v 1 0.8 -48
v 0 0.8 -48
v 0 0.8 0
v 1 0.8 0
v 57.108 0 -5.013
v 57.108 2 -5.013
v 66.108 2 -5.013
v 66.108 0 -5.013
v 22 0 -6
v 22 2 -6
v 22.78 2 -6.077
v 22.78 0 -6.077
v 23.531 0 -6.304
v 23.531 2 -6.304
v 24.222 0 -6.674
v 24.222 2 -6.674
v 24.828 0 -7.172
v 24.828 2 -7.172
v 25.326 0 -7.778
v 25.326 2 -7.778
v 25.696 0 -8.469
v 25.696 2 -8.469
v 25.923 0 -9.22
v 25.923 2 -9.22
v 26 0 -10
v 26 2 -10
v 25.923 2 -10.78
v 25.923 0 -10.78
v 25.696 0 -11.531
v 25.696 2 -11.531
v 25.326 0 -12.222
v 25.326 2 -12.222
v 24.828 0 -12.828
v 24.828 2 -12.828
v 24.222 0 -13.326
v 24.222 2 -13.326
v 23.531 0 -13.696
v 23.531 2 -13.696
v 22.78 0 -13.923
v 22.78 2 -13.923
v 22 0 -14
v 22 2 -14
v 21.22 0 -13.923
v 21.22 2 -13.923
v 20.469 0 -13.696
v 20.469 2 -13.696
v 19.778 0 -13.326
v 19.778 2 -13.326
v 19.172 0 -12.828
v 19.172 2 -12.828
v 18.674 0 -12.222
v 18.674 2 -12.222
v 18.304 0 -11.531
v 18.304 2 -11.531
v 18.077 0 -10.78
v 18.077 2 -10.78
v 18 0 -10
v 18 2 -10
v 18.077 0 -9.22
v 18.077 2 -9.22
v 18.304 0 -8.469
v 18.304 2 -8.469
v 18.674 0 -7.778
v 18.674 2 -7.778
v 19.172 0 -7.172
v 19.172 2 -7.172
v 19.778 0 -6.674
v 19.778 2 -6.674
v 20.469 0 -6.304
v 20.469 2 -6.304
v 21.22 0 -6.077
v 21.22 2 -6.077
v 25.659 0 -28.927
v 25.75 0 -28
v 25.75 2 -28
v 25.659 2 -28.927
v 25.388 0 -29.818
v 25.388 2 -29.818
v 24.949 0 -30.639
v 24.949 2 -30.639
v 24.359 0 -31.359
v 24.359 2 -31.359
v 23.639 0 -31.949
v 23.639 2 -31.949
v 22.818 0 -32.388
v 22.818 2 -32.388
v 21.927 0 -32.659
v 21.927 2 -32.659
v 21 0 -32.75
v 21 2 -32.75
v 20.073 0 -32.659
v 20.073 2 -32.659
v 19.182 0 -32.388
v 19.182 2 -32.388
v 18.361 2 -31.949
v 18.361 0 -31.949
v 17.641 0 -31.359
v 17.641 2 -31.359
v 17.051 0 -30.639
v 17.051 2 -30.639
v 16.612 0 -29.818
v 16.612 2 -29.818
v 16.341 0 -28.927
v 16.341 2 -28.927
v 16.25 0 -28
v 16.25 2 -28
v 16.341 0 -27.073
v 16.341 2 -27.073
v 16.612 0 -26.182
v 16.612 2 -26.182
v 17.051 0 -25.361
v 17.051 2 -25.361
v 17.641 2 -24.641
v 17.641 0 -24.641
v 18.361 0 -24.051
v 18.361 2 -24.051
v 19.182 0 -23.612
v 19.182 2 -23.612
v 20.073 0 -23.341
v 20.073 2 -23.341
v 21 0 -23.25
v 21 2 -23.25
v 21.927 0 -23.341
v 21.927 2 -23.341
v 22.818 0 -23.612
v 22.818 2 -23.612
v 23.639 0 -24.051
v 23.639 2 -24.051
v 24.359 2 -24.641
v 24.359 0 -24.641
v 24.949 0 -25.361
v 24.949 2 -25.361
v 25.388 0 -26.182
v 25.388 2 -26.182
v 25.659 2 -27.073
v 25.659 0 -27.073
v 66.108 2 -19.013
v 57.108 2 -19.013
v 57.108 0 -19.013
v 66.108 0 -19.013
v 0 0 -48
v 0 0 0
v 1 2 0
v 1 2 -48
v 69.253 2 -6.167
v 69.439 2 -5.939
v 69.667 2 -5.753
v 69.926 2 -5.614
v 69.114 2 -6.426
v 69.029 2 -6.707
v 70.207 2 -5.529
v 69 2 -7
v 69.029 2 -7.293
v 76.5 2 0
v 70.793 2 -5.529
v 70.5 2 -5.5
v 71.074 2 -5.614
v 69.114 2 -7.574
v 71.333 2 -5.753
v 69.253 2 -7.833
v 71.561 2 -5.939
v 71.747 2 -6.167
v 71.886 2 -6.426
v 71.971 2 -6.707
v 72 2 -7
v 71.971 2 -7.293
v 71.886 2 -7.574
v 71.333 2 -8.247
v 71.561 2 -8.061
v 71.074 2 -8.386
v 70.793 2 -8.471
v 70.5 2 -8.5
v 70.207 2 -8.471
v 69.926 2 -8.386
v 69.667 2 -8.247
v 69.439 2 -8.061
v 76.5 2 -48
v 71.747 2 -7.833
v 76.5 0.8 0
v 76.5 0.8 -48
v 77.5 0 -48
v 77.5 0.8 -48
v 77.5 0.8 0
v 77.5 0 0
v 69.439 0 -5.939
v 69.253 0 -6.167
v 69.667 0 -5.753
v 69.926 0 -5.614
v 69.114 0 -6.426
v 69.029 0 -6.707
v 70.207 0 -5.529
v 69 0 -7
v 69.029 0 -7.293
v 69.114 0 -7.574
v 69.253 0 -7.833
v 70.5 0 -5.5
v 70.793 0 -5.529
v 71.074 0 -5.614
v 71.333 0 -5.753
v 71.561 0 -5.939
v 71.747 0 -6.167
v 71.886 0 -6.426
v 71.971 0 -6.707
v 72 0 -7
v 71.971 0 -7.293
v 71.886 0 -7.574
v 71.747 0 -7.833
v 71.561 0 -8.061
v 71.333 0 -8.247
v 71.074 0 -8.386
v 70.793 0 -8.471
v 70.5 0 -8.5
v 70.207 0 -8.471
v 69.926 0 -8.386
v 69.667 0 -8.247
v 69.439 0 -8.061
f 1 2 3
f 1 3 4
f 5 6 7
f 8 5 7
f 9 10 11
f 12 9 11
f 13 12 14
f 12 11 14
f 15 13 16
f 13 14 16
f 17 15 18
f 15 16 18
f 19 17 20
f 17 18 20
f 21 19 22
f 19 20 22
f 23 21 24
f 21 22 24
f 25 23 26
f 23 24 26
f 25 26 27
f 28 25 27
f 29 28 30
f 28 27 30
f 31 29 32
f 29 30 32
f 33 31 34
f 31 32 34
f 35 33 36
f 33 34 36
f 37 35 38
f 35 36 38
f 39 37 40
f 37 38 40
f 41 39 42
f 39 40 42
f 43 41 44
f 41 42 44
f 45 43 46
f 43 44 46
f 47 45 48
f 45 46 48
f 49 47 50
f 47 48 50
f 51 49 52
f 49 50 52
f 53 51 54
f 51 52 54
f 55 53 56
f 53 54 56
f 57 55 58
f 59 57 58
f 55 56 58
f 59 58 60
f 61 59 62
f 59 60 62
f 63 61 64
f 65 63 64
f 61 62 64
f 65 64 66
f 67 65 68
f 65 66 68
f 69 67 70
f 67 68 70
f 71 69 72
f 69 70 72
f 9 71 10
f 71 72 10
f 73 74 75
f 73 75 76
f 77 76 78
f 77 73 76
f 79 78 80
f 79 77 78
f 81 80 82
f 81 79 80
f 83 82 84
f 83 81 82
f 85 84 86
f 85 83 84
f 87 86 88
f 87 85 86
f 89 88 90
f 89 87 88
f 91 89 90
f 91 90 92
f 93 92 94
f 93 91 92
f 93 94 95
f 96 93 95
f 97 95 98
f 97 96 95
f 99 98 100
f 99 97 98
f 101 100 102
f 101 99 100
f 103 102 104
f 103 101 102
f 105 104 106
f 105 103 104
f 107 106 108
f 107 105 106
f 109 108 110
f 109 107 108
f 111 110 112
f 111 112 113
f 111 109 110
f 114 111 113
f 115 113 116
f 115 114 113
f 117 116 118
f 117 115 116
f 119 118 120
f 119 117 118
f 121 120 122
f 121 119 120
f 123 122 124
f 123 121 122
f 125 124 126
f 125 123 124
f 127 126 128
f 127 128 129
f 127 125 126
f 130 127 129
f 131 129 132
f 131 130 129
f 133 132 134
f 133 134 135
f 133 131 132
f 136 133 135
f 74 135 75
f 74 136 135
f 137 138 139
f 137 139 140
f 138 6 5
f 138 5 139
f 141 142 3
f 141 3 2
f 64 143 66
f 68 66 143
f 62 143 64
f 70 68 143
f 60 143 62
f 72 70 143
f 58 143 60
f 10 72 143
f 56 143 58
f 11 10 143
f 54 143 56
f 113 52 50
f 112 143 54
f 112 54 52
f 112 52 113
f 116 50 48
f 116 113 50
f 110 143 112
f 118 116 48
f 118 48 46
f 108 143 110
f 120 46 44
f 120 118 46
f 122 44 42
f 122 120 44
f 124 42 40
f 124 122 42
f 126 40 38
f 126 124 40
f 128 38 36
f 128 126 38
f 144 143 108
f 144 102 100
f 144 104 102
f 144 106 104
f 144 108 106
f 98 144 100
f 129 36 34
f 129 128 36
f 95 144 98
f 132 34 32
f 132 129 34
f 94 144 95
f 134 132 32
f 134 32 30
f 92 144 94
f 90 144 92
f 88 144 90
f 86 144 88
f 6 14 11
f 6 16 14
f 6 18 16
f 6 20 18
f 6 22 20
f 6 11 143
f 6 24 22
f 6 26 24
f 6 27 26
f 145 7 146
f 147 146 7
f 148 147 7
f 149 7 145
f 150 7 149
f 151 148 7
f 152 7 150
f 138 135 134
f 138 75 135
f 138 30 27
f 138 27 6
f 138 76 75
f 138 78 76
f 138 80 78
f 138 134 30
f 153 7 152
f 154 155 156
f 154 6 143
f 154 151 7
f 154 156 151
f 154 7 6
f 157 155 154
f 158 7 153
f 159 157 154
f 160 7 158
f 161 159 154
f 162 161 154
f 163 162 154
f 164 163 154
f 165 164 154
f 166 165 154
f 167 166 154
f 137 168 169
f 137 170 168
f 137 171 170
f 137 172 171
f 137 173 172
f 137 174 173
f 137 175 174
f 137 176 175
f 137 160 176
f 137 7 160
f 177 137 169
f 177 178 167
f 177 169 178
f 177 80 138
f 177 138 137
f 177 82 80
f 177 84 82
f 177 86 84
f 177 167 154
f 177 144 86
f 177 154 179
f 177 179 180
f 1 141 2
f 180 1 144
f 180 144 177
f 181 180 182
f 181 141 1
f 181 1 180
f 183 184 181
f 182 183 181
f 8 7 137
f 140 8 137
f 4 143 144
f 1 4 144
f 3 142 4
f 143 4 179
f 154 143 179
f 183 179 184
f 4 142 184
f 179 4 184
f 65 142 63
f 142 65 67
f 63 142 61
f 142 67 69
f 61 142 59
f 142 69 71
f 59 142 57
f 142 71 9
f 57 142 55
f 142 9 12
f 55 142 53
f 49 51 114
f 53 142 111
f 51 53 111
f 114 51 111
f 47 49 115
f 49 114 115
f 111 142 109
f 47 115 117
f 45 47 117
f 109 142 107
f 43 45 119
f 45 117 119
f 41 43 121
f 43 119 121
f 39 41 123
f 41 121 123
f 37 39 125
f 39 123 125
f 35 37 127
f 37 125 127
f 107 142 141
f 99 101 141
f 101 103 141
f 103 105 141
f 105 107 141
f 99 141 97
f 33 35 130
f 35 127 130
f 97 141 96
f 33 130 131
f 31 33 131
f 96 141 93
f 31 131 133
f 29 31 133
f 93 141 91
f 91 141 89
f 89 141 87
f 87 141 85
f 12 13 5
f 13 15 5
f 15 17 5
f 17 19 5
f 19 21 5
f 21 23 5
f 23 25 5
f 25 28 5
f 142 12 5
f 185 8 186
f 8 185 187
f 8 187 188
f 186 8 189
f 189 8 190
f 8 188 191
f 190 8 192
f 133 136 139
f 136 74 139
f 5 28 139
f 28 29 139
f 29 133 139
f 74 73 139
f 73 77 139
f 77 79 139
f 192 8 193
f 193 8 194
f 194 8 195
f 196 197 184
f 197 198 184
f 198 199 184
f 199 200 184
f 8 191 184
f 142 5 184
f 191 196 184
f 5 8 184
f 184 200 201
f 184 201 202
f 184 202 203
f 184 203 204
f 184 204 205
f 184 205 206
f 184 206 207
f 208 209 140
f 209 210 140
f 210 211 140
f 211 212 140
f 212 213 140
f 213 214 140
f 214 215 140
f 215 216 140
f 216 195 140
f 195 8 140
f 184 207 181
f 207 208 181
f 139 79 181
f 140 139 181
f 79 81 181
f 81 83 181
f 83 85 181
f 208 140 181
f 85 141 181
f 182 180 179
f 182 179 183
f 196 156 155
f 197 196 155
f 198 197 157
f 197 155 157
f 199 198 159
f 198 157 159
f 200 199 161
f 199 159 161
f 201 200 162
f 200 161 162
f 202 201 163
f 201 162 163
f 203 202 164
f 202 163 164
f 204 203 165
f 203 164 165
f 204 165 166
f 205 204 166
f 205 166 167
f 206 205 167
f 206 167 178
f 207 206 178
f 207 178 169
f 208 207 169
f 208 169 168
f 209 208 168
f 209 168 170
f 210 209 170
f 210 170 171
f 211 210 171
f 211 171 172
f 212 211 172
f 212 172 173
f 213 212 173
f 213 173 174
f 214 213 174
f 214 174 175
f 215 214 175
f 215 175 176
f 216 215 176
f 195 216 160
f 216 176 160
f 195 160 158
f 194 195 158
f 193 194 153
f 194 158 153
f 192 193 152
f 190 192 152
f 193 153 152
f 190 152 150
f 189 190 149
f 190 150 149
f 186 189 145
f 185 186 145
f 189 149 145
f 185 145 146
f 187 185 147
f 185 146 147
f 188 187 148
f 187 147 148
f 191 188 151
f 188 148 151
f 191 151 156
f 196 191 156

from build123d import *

# Parameters (mm, degrees)
SKETCH1_W              = 77.5
SKETCH1_H              = 48
BOSS_EXTRUDE1_DEPTH    = 2
SKETCH2_W              = 1
SKETCH2_H              = 48
CUT_EXTRUDE1_DEPTH     = 1.2
SKETCH3_R              = 4
CUT_EXTRUDE2_DEPTH     = 2
SKETCH4_R              = 1.5
SKETCH4_W              = 9
SKETCH4_H              = 14
CUT_EXTRUDE3_DEPTH     = 12
CUT_EXTRUDE4_OUTLINE_R = 4.75
CUT_EXTRUDE4_DEPTH     = 2


# Read off the part's stored shape, not the designer's step: Cut-Extrude4
with BuildPart() as part:
    # Sketch1 → Boss-Extrude1 (new body)
    with BuildSketch(Plane(origin=(0, 0, 0), x_dir=(1, 0, 0), z_dir=(0, 1, 0))):
        with Locations((38.75, 24)):
            Rectangle(SKETCH1_W, SKETCH1_H)
    extrude(amount=BOSS_EXTRUDE1_DEPTH)

    # Sketch2 → Cut-Extrude1 (cut)
    with BuildSketch(Plane(origin=(0, 2, 0), x_dir=(1, 0, 0), z_dir=(0, 1, 0))):
        with Locations((0.5, 24)):
            Rectangle(SKETCH2_W, SKETCH2_H)
        with Locations((77, 24)):
            Rectangle(SKETCH2_W, SKETCH2_H)
    extrude(amount=-CUT_EXTRUDE1_DEPTH, mode=Mode.SUBTRACT)

    # Sketch3 → Cut-Extrude2 (cut)
    with BuildSketch(Plane(origin=(0, 2, 0), x_dir=(1, 0, 0), z_dir=(0, 1, 0))):
        with Locations(Location((22, 10, 0), (0, 0, 270))):
            Circle(SKETCH3_R)
    extrude(amount=-CUT_EXTRUDE2_DEPTH, mode=Mode.SUBTRACT)

    # Sketch4 → Cut-Extrude3 (cut)
    with BuildSketch(Plane(origin=(0, 2, 0), x_dir=(1, 0, 0), z_dir=(0, 1, 0))):
        with Locations(Location((70.5, 7, 0), (0, 0, 270))):
            Circle(SKETCH4_R)
        with Locations((61.608422626, 12.013032017)):
            Rectangle(SKETCH4_W, SKETCH4_H)
    extrude(amount=-CUT_EXTRUDE3_DEPTH, mode=Mode.SUBTRACT)

    # Cut-Extrude4 outline → Cut-Extrude4 (cut)
    with BuildSketch(Plane(origin=(0, 0, 0), x_dir=(1, 0, 0), z_dir=(0, 1, 0))):
        with Locations((21, 28)):
            Circle(CUT_EXTRUDE4_OUTLINE_R)
    extrude(amount=CUT_EXTRUDE4_DEPTH, mode=Mode.SUBTRACT)


solid = part.part
